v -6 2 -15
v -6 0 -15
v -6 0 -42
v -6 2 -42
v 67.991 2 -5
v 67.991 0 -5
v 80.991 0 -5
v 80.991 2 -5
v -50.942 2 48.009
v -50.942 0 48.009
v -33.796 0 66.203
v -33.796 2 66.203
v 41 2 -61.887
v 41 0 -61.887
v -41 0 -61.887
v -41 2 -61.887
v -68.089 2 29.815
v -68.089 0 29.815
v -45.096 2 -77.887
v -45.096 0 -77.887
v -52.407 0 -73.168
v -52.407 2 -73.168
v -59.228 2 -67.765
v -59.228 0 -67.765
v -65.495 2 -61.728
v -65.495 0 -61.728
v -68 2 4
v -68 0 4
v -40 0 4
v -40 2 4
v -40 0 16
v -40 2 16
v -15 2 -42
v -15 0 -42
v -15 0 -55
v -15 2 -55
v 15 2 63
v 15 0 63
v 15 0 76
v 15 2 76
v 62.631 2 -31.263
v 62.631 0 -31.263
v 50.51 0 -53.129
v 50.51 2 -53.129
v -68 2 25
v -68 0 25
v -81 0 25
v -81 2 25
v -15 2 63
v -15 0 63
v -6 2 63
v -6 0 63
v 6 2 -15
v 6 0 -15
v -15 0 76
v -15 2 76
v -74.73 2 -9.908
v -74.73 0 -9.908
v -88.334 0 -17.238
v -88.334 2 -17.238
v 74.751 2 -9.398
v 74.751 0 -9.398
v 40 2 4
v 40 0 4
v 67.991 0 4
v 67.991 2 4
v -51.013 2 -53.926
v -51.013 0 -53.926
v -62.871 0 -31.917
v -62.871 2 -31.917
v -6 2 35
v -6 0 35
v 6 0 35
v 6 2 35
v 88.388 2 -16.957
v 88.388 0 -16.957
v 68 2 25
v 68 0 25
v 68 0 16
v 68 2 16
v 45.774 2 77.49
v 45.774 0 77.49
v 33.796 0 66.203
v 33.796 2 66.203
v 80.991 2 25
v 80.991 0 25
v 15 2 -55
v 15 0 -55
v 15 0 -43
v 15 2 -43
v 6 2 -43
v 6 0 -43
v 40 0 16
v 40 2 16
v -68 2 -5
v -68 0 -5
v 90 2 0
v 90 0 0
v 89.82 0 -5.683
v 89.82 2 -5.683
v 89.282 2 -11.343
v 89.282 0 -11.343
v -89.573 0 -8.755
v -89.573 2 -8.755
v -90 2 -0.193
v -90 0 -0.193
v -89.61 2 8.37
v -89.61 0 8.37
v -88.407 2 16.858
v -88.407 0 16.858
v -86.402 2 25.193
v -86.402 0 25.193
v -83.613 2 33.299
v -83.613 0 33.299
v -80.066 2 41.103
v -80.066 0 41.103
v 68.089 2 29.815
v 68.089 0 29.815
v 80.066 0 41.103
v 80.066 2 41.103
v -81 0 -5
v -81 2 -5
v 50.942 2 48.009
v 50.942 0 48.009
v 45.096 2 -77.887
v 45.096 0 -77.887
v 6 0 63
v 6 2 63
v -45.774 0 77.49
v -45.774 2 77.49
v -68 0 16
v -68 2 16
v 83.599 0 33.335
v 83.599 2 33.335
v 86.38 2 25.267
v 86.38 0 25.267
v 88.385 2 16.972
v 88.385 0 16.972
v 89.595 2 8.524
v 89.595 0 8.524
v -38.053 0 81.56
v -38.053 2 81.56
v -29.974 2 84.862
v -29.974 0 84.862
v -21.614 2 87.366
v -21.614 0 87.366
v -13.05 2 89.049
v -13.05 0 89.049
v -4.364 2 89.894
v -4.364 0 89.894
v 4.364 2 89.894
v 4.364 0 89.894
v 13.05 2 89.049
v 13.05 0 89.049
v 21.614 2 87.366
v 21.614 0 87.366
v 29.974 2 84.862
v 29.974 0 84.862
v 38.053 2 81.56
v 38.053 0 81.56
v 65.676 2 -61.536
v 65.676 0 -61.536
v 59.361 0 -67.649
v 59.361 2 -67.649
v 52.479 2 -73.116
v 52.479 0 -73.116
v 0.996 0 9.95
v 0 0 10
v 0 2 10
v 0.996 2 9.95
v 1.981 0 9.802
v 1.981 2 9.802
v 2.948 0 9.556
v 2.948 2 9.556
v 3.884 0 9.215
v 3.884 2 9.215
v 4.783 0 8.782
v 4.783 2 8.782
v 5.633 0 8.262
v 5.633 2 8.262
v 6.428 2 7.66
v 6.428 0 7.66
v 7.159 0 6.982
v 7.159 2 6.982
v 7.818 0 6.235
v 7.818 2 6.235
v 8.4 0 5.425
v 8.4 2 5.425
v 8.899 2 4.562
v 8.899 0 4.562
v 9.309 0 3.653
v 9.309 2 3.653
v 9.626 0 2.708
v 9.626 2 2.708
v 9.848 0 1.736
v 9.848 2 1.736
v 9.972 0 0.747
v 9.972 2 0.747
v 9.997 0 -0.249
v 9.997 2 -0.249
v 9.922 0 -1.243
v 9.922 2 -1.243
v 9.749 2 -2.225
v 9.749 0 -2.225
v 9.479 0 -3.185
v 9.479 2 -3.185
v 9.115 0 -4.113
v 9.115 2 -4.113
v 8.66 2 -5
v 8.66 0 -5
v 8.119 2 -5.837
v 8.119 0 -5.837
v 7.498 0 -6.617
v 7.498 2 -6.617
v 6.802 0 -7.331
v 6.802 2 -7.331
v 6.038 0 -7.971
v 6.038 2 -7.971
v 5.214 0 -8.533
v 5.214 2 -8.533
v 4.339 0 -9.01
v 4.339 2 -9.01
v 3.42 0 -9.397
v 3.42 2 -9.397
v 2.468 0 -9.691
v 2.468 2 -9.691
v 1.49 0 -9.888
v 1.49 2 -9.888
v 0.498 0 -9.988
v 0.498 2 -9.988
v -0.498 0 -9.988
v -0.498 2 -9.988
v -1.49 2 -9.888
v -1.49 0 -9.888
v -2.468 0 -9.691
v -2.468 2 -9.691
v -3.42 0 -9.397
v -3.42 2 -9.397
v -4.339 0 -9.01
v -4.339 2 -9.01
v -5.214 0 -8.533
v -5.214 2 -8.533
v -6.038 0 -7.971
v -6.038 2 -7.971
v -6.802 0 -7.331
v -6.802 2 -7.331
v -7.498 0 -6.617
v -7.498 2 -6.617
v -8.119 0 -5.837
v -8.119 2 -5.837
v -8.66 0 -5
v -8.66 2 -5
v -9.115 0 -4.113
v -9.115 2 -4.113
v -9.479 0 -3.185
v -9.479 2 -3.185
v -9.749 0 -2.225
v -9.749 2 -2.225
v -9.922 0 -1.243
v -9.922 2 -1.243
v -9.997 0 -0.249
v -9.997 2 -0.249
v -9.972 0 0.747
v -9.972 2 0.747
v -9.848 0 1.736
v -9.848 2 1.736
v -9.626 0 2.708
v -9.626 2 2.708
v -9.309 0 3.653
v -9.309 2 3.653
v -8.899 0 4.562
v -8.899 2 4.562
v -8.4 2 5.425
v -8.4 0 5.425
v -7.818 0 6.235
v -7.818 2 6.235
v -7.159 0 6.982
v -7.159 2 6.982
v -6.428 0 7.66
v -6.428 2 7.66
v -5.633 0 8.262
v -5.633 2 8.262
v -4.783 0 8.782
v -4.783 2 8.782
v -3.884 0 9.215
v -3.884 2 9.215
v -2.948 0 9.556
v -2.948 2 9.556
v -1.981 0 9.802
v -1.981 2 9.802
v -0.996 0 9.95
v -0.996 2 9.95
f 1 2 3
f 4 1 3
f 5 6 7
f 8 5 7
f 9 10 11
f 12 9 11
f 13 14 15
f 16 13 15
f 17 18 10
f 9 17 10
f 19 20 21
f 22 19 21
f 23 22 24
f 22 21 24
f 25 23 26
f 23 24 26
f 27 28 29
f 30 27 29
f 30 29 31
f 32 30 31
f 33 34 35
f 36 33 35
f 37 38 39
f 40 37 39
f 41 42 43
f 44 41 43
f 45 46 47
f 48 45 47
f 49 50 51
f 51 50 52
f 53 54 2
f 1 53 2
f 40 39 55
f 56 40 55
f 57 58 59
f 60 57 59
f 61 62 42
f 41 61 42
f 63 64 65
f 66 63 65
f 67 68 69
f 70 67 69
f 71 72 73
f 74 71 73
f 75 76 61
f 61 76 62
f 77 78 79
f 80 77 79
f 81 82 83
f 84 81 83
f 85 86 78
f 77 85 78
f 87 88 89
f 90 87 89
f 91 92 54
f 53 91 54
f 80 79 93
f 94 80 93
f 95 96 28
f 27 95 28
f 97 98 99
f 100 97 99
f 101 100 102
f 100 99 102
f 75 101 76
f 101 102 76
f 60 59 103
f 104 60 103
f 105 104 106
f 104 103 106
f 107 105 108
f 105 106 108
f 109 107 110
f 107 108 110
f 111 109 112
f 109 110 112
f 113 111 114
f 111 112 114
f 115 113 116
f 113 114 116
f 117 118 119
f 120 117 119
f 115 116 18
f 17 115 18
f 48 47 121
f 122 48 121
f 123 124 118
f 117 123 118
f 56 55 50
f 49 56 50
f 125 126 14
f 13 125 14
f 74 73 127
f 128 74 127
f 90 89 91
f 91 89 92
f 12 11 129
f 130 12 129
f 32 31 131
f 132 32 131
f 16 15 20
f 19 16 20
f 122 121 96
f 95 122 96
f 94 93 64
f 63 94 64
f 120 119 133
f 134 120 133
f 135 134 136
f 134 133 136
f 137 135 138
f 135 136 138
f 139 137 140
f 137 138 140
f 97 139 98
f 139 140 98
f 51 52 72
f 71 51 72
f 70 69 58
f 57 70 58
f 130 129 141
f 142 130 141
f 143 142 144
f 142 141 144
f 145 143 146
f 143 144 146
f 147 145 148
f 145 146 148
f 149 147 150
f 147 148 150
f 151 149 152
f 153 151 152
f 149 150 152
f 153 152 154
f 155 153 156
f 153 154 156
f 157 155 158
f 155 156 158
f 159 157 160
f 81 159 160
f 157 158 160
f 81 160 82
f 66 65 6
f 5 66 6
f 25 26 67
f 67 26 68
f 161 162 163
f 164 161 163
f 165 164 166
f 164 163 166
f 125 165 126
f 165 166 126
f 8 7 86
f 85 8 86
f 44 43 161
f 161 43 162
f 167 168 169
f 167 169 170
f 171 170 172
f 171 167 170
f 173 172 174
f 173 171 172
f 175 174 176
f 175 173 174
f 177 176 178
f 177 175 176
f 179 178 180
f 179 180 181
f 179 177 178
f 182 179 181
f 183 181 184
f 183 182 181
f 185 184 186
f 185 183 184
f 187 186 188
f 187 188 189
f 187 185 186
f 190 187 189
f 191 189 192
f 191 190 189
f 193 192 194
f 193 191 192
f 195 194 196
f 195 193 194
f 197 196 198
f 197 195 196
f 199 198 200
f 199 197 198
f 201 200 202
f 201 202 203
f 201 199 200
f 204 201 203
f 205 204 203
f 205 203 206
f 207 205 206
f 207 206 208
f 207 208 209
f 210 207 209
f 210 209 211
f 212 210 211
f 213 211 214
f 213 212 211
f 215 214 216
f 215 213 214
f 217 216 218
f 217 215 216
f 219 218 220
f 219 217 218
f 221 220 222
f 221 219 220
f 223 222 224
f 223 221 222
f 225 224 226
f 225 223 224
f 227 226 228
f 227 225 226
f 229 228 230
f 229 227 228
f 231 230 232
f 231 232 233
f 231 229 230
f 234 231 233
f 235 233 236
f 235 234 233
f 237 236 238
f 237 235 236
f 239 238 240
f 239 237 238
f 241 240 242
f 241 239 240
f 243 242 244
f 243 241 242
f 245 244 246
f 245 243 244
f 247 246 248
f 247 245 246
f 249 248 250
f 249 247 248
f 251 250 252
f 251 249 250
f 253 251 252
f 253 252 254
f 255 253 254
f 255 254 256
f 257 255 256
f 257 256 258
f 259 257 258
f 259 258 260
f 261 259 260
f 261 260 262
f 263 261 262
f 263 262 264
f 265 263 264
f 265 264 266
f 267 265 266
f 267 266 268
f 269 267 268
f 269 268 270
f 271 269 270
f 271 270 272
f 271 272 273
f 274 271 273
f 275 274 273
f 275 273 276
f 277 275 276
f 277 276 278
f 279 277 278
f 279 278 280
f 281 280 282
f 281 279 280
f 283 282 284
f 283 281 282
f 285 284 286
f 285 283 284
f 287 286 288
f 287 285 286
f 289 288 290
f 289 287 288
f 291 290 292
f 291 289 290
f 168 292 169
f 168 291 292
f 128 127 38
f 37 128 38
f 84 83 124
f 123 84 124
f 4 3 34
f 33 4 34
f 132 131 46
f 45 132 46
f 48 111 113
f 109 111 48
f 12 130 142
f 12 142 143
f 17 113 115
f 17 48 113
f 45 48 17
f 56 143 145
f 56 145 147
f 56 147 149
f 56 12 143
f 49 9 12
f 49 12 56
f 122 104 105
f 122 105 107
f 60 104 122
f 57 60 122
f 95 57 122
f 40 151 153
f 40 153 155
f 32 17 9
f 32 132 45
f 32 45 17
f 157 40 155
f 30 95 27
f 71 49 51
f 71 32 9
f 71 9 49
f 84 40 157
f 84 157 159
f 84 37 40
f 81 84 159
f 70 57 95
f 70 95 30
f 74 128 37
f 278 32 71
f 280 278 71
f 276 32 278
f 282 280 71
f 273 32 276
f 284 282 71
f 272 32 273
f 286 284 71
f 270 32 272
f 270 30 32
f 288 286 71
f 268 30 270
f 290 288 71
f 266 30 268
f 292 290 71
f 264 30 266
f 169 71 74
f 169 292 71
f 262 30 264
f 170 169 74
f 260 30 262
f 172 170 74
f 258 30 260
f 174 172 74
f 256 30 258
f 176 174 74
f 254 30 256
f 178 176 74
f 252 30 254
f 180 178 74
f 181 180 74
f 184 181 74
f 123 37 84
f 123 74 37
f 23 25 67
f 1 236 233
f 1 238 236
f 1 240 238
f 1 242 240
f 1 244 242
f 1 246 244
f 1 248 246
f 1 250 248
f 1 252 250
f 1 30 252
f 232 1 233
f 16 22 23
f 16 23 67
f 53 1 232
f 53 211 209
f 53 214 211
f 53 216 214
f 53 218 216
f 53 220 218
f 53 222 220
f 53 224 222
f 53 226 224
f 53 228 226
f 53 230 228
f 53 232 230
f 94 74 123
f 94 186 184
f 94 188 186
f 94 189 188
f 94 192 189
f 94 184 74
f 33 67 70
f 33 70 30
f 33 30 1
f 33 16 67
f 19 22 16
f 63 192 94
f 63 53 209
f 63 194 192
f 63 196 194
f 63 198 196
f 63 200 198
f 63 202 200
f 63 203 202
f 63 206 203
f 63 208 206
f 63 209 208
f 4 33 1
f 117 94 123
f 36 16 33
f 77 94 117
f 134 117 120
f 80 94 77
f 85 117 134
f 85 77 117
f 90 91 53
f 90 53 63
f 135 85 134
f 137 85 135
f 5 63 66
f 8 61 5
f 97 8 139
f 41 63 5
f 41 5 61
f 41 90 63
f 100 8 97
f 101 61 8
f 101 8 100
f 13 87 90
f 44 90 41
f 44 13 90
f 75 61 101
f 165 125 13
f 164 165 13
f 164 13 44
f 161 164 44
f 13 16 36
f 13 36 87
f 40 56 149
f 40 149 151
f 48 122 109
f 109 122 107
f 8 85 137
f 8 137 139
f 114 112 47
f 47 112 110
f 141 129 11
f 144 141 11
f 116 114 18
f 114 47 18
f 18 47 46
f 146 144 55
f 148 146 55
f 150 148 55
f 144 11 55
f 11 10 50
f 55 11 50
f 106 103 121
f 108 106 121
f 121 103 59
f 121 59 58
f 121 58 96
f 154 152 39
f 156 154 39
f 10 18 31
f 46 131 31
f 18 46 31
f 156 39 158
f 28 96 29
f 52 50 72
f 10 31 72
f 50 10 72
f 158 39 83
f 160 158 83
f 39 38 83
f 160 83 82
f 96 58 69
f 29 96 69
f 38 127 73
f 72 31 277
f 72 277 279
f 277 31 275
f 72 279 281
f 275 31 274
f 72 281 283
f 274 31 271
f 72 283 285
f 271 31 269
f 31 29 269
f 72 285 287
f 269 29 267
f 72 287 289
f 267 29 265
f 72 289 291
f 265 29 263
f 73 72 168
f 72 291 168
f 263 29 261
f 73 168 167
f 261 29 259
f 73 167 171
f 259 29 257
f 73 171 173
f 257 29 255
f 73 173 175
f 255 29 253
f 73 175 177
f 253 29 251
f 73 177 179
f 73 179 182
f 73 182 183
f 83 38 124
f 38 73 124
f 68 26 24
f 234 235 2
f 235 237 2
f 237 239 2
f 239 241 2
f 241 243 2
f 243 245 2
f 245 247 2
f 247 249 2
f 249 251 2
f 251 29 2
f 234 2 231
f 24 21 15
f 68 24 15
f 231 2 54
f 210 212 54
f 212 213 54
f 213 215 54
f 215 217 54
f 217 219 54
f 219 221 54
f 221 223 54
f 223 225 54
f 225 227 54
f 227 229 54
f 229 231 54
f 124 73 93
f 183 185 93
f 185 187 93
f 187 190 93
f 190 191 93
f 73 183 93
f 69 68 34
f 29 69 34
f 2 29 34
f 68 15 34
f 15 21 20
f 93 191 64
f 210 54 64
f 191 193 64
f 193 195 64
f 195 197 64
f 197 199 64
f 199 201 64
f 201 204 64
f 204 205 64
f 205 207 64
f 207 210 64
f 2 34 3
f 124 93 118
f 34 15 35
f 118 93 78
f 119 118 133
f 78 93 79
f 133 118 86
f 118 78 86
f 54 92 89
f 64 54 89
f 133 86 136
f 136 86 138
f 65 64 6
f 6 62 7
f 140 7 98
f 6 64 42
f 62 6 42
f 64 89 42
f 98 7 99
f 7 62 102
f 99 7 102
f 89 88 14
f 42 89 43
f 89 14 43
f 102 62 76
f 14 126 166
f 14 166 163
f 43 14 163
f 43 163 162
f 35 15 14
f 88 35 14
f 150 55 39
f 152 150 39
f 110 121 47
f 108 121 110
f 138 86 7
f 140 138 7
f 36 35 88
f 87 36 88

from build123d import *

# Parameters (mm, degrees)
SKETCH1_R           = 10
BOSS_EXTRUDE1_DEPTH = 2


with BuildPart() as part:
    # Sketch1 → Boss-Extrude1 (new body)
    with BuildSketch(Plane(origin=(0, 0, 0), x_dir=(1, 0, 0), z_dir=(0, 1, 0))):
        with BuildLine():
            Line((74.750839635, 9.397976908), (62.630621153, 31.263481795))
            Line((62.630621153, 31.263481795), (50.510402672, 53.128986682))
            Line((50.510402672, 53.128986682), (65.676291813, 61.535556337))
            ThreePointArc((65.676291813, 61.535556337), (55.986333501, 70.466520143), (45.096073772, 77.886739118))
            Line((45.096073772, 77.886739118), (41, 61.886739118))
            Line((41, 61.886739118), (0, 61.886739118))
            Line((0, 61.886739118), (-41, 61.886739118))
            Line((-41, 61.886739118), (-45.096073772, 77.886739118))
            ThreePointArc((-45.096073772, 77.886739118), (-55.882783617, 70.548667565), (-65.495262312, 61.728199509))
            Line((-65.495262312, 61.728199509), (-51.013470384, 53.925622849))
            Line((-51.013470384, 53.925622849), (-62.871489624, 31.916820526))
            Line((-62.871489624, 31.916820526), (-74.729508865, 9.908018203))
            Line((-74.729508865, 9.908018203), (-88.333788079, 17.237803909))
            ThreePointArc((-88.333788079, 17.237803909), (-89.109620692, -12.628360942), (-80.06590623, -41.102927627))
            Line((-80.06590623, -41.102927627), (-68.088543882, -29.815267766))
            Line((-68.088543882, -29.815267766), (-50.942469943, -48.009007032))
            Line((-50.942469943, -48.009007032), (-33.796396003, -66.202746297))
            Line((-33.796396003, -66.202746297), (-45.773758351, -77.490406158))
            ThreePointArc((-45.773758351, -77.490406158), (0, -90), (45.773758351, -77.490406158))
            Line((45.773758351, -77.490406158), (33.796396003, -66.202746297))
            Line((33.796396003, -66.202746297), (50.942469943, -48.009007032))
            Line((50.942469943, -48.009007032), (68.088543882, -29.815267766))
            Line((68.088543882, -29.815267766), (80.06590623, -41.102927627))
            ThreePointArc((80.06590623, -41.102927627), (87.481231018, -21.143183763), (90, 0))
            ThreePointArc((90, 0), (89.596114425, 8.516823346), (88.388082669, 16.957206202))
            Line((88.388082669, 16.957206202), (74.750839635, 9.397976908))
        make_face()
        Polygon((-68, 5), (-68, -4), (-40, -4), (-40, -16), (-68, -16), (-68, -25), (-81, -25), (-81, 5), align=None, mode=Mode.SUBTRACT)
        Polygon((-15, -63), (-6, -63), (-6, -35), (6, -35), (6, -63), (15, -63), (15, -76), (-15, -76), align=None, mode=Mode.SUBTRACT)
        Polygon((68, -25), (68, -16), (40, -16), (40, -4), (67.990906131, -4), (67.990906131, 5), (80.990906131, 5), (80.990906131, -25), align=None, mode=Mode.SUBTRACT)
        Polygon((15, 43), (6, 43), (6, 15), (-6, 15), (-6, 42), (-15, 42), (-15, 55), (15, 55), align=None, mode=Mode.SUBTRACT)
        with Locations(Location((0, 0, 0), (0, 0, 270))):
            Circle(SKETCH1_R, mode=Mode.SUBTRACT)
    extrude(amount=BOSS_EXTRUDE1_DEPTH)


solid = part.part
